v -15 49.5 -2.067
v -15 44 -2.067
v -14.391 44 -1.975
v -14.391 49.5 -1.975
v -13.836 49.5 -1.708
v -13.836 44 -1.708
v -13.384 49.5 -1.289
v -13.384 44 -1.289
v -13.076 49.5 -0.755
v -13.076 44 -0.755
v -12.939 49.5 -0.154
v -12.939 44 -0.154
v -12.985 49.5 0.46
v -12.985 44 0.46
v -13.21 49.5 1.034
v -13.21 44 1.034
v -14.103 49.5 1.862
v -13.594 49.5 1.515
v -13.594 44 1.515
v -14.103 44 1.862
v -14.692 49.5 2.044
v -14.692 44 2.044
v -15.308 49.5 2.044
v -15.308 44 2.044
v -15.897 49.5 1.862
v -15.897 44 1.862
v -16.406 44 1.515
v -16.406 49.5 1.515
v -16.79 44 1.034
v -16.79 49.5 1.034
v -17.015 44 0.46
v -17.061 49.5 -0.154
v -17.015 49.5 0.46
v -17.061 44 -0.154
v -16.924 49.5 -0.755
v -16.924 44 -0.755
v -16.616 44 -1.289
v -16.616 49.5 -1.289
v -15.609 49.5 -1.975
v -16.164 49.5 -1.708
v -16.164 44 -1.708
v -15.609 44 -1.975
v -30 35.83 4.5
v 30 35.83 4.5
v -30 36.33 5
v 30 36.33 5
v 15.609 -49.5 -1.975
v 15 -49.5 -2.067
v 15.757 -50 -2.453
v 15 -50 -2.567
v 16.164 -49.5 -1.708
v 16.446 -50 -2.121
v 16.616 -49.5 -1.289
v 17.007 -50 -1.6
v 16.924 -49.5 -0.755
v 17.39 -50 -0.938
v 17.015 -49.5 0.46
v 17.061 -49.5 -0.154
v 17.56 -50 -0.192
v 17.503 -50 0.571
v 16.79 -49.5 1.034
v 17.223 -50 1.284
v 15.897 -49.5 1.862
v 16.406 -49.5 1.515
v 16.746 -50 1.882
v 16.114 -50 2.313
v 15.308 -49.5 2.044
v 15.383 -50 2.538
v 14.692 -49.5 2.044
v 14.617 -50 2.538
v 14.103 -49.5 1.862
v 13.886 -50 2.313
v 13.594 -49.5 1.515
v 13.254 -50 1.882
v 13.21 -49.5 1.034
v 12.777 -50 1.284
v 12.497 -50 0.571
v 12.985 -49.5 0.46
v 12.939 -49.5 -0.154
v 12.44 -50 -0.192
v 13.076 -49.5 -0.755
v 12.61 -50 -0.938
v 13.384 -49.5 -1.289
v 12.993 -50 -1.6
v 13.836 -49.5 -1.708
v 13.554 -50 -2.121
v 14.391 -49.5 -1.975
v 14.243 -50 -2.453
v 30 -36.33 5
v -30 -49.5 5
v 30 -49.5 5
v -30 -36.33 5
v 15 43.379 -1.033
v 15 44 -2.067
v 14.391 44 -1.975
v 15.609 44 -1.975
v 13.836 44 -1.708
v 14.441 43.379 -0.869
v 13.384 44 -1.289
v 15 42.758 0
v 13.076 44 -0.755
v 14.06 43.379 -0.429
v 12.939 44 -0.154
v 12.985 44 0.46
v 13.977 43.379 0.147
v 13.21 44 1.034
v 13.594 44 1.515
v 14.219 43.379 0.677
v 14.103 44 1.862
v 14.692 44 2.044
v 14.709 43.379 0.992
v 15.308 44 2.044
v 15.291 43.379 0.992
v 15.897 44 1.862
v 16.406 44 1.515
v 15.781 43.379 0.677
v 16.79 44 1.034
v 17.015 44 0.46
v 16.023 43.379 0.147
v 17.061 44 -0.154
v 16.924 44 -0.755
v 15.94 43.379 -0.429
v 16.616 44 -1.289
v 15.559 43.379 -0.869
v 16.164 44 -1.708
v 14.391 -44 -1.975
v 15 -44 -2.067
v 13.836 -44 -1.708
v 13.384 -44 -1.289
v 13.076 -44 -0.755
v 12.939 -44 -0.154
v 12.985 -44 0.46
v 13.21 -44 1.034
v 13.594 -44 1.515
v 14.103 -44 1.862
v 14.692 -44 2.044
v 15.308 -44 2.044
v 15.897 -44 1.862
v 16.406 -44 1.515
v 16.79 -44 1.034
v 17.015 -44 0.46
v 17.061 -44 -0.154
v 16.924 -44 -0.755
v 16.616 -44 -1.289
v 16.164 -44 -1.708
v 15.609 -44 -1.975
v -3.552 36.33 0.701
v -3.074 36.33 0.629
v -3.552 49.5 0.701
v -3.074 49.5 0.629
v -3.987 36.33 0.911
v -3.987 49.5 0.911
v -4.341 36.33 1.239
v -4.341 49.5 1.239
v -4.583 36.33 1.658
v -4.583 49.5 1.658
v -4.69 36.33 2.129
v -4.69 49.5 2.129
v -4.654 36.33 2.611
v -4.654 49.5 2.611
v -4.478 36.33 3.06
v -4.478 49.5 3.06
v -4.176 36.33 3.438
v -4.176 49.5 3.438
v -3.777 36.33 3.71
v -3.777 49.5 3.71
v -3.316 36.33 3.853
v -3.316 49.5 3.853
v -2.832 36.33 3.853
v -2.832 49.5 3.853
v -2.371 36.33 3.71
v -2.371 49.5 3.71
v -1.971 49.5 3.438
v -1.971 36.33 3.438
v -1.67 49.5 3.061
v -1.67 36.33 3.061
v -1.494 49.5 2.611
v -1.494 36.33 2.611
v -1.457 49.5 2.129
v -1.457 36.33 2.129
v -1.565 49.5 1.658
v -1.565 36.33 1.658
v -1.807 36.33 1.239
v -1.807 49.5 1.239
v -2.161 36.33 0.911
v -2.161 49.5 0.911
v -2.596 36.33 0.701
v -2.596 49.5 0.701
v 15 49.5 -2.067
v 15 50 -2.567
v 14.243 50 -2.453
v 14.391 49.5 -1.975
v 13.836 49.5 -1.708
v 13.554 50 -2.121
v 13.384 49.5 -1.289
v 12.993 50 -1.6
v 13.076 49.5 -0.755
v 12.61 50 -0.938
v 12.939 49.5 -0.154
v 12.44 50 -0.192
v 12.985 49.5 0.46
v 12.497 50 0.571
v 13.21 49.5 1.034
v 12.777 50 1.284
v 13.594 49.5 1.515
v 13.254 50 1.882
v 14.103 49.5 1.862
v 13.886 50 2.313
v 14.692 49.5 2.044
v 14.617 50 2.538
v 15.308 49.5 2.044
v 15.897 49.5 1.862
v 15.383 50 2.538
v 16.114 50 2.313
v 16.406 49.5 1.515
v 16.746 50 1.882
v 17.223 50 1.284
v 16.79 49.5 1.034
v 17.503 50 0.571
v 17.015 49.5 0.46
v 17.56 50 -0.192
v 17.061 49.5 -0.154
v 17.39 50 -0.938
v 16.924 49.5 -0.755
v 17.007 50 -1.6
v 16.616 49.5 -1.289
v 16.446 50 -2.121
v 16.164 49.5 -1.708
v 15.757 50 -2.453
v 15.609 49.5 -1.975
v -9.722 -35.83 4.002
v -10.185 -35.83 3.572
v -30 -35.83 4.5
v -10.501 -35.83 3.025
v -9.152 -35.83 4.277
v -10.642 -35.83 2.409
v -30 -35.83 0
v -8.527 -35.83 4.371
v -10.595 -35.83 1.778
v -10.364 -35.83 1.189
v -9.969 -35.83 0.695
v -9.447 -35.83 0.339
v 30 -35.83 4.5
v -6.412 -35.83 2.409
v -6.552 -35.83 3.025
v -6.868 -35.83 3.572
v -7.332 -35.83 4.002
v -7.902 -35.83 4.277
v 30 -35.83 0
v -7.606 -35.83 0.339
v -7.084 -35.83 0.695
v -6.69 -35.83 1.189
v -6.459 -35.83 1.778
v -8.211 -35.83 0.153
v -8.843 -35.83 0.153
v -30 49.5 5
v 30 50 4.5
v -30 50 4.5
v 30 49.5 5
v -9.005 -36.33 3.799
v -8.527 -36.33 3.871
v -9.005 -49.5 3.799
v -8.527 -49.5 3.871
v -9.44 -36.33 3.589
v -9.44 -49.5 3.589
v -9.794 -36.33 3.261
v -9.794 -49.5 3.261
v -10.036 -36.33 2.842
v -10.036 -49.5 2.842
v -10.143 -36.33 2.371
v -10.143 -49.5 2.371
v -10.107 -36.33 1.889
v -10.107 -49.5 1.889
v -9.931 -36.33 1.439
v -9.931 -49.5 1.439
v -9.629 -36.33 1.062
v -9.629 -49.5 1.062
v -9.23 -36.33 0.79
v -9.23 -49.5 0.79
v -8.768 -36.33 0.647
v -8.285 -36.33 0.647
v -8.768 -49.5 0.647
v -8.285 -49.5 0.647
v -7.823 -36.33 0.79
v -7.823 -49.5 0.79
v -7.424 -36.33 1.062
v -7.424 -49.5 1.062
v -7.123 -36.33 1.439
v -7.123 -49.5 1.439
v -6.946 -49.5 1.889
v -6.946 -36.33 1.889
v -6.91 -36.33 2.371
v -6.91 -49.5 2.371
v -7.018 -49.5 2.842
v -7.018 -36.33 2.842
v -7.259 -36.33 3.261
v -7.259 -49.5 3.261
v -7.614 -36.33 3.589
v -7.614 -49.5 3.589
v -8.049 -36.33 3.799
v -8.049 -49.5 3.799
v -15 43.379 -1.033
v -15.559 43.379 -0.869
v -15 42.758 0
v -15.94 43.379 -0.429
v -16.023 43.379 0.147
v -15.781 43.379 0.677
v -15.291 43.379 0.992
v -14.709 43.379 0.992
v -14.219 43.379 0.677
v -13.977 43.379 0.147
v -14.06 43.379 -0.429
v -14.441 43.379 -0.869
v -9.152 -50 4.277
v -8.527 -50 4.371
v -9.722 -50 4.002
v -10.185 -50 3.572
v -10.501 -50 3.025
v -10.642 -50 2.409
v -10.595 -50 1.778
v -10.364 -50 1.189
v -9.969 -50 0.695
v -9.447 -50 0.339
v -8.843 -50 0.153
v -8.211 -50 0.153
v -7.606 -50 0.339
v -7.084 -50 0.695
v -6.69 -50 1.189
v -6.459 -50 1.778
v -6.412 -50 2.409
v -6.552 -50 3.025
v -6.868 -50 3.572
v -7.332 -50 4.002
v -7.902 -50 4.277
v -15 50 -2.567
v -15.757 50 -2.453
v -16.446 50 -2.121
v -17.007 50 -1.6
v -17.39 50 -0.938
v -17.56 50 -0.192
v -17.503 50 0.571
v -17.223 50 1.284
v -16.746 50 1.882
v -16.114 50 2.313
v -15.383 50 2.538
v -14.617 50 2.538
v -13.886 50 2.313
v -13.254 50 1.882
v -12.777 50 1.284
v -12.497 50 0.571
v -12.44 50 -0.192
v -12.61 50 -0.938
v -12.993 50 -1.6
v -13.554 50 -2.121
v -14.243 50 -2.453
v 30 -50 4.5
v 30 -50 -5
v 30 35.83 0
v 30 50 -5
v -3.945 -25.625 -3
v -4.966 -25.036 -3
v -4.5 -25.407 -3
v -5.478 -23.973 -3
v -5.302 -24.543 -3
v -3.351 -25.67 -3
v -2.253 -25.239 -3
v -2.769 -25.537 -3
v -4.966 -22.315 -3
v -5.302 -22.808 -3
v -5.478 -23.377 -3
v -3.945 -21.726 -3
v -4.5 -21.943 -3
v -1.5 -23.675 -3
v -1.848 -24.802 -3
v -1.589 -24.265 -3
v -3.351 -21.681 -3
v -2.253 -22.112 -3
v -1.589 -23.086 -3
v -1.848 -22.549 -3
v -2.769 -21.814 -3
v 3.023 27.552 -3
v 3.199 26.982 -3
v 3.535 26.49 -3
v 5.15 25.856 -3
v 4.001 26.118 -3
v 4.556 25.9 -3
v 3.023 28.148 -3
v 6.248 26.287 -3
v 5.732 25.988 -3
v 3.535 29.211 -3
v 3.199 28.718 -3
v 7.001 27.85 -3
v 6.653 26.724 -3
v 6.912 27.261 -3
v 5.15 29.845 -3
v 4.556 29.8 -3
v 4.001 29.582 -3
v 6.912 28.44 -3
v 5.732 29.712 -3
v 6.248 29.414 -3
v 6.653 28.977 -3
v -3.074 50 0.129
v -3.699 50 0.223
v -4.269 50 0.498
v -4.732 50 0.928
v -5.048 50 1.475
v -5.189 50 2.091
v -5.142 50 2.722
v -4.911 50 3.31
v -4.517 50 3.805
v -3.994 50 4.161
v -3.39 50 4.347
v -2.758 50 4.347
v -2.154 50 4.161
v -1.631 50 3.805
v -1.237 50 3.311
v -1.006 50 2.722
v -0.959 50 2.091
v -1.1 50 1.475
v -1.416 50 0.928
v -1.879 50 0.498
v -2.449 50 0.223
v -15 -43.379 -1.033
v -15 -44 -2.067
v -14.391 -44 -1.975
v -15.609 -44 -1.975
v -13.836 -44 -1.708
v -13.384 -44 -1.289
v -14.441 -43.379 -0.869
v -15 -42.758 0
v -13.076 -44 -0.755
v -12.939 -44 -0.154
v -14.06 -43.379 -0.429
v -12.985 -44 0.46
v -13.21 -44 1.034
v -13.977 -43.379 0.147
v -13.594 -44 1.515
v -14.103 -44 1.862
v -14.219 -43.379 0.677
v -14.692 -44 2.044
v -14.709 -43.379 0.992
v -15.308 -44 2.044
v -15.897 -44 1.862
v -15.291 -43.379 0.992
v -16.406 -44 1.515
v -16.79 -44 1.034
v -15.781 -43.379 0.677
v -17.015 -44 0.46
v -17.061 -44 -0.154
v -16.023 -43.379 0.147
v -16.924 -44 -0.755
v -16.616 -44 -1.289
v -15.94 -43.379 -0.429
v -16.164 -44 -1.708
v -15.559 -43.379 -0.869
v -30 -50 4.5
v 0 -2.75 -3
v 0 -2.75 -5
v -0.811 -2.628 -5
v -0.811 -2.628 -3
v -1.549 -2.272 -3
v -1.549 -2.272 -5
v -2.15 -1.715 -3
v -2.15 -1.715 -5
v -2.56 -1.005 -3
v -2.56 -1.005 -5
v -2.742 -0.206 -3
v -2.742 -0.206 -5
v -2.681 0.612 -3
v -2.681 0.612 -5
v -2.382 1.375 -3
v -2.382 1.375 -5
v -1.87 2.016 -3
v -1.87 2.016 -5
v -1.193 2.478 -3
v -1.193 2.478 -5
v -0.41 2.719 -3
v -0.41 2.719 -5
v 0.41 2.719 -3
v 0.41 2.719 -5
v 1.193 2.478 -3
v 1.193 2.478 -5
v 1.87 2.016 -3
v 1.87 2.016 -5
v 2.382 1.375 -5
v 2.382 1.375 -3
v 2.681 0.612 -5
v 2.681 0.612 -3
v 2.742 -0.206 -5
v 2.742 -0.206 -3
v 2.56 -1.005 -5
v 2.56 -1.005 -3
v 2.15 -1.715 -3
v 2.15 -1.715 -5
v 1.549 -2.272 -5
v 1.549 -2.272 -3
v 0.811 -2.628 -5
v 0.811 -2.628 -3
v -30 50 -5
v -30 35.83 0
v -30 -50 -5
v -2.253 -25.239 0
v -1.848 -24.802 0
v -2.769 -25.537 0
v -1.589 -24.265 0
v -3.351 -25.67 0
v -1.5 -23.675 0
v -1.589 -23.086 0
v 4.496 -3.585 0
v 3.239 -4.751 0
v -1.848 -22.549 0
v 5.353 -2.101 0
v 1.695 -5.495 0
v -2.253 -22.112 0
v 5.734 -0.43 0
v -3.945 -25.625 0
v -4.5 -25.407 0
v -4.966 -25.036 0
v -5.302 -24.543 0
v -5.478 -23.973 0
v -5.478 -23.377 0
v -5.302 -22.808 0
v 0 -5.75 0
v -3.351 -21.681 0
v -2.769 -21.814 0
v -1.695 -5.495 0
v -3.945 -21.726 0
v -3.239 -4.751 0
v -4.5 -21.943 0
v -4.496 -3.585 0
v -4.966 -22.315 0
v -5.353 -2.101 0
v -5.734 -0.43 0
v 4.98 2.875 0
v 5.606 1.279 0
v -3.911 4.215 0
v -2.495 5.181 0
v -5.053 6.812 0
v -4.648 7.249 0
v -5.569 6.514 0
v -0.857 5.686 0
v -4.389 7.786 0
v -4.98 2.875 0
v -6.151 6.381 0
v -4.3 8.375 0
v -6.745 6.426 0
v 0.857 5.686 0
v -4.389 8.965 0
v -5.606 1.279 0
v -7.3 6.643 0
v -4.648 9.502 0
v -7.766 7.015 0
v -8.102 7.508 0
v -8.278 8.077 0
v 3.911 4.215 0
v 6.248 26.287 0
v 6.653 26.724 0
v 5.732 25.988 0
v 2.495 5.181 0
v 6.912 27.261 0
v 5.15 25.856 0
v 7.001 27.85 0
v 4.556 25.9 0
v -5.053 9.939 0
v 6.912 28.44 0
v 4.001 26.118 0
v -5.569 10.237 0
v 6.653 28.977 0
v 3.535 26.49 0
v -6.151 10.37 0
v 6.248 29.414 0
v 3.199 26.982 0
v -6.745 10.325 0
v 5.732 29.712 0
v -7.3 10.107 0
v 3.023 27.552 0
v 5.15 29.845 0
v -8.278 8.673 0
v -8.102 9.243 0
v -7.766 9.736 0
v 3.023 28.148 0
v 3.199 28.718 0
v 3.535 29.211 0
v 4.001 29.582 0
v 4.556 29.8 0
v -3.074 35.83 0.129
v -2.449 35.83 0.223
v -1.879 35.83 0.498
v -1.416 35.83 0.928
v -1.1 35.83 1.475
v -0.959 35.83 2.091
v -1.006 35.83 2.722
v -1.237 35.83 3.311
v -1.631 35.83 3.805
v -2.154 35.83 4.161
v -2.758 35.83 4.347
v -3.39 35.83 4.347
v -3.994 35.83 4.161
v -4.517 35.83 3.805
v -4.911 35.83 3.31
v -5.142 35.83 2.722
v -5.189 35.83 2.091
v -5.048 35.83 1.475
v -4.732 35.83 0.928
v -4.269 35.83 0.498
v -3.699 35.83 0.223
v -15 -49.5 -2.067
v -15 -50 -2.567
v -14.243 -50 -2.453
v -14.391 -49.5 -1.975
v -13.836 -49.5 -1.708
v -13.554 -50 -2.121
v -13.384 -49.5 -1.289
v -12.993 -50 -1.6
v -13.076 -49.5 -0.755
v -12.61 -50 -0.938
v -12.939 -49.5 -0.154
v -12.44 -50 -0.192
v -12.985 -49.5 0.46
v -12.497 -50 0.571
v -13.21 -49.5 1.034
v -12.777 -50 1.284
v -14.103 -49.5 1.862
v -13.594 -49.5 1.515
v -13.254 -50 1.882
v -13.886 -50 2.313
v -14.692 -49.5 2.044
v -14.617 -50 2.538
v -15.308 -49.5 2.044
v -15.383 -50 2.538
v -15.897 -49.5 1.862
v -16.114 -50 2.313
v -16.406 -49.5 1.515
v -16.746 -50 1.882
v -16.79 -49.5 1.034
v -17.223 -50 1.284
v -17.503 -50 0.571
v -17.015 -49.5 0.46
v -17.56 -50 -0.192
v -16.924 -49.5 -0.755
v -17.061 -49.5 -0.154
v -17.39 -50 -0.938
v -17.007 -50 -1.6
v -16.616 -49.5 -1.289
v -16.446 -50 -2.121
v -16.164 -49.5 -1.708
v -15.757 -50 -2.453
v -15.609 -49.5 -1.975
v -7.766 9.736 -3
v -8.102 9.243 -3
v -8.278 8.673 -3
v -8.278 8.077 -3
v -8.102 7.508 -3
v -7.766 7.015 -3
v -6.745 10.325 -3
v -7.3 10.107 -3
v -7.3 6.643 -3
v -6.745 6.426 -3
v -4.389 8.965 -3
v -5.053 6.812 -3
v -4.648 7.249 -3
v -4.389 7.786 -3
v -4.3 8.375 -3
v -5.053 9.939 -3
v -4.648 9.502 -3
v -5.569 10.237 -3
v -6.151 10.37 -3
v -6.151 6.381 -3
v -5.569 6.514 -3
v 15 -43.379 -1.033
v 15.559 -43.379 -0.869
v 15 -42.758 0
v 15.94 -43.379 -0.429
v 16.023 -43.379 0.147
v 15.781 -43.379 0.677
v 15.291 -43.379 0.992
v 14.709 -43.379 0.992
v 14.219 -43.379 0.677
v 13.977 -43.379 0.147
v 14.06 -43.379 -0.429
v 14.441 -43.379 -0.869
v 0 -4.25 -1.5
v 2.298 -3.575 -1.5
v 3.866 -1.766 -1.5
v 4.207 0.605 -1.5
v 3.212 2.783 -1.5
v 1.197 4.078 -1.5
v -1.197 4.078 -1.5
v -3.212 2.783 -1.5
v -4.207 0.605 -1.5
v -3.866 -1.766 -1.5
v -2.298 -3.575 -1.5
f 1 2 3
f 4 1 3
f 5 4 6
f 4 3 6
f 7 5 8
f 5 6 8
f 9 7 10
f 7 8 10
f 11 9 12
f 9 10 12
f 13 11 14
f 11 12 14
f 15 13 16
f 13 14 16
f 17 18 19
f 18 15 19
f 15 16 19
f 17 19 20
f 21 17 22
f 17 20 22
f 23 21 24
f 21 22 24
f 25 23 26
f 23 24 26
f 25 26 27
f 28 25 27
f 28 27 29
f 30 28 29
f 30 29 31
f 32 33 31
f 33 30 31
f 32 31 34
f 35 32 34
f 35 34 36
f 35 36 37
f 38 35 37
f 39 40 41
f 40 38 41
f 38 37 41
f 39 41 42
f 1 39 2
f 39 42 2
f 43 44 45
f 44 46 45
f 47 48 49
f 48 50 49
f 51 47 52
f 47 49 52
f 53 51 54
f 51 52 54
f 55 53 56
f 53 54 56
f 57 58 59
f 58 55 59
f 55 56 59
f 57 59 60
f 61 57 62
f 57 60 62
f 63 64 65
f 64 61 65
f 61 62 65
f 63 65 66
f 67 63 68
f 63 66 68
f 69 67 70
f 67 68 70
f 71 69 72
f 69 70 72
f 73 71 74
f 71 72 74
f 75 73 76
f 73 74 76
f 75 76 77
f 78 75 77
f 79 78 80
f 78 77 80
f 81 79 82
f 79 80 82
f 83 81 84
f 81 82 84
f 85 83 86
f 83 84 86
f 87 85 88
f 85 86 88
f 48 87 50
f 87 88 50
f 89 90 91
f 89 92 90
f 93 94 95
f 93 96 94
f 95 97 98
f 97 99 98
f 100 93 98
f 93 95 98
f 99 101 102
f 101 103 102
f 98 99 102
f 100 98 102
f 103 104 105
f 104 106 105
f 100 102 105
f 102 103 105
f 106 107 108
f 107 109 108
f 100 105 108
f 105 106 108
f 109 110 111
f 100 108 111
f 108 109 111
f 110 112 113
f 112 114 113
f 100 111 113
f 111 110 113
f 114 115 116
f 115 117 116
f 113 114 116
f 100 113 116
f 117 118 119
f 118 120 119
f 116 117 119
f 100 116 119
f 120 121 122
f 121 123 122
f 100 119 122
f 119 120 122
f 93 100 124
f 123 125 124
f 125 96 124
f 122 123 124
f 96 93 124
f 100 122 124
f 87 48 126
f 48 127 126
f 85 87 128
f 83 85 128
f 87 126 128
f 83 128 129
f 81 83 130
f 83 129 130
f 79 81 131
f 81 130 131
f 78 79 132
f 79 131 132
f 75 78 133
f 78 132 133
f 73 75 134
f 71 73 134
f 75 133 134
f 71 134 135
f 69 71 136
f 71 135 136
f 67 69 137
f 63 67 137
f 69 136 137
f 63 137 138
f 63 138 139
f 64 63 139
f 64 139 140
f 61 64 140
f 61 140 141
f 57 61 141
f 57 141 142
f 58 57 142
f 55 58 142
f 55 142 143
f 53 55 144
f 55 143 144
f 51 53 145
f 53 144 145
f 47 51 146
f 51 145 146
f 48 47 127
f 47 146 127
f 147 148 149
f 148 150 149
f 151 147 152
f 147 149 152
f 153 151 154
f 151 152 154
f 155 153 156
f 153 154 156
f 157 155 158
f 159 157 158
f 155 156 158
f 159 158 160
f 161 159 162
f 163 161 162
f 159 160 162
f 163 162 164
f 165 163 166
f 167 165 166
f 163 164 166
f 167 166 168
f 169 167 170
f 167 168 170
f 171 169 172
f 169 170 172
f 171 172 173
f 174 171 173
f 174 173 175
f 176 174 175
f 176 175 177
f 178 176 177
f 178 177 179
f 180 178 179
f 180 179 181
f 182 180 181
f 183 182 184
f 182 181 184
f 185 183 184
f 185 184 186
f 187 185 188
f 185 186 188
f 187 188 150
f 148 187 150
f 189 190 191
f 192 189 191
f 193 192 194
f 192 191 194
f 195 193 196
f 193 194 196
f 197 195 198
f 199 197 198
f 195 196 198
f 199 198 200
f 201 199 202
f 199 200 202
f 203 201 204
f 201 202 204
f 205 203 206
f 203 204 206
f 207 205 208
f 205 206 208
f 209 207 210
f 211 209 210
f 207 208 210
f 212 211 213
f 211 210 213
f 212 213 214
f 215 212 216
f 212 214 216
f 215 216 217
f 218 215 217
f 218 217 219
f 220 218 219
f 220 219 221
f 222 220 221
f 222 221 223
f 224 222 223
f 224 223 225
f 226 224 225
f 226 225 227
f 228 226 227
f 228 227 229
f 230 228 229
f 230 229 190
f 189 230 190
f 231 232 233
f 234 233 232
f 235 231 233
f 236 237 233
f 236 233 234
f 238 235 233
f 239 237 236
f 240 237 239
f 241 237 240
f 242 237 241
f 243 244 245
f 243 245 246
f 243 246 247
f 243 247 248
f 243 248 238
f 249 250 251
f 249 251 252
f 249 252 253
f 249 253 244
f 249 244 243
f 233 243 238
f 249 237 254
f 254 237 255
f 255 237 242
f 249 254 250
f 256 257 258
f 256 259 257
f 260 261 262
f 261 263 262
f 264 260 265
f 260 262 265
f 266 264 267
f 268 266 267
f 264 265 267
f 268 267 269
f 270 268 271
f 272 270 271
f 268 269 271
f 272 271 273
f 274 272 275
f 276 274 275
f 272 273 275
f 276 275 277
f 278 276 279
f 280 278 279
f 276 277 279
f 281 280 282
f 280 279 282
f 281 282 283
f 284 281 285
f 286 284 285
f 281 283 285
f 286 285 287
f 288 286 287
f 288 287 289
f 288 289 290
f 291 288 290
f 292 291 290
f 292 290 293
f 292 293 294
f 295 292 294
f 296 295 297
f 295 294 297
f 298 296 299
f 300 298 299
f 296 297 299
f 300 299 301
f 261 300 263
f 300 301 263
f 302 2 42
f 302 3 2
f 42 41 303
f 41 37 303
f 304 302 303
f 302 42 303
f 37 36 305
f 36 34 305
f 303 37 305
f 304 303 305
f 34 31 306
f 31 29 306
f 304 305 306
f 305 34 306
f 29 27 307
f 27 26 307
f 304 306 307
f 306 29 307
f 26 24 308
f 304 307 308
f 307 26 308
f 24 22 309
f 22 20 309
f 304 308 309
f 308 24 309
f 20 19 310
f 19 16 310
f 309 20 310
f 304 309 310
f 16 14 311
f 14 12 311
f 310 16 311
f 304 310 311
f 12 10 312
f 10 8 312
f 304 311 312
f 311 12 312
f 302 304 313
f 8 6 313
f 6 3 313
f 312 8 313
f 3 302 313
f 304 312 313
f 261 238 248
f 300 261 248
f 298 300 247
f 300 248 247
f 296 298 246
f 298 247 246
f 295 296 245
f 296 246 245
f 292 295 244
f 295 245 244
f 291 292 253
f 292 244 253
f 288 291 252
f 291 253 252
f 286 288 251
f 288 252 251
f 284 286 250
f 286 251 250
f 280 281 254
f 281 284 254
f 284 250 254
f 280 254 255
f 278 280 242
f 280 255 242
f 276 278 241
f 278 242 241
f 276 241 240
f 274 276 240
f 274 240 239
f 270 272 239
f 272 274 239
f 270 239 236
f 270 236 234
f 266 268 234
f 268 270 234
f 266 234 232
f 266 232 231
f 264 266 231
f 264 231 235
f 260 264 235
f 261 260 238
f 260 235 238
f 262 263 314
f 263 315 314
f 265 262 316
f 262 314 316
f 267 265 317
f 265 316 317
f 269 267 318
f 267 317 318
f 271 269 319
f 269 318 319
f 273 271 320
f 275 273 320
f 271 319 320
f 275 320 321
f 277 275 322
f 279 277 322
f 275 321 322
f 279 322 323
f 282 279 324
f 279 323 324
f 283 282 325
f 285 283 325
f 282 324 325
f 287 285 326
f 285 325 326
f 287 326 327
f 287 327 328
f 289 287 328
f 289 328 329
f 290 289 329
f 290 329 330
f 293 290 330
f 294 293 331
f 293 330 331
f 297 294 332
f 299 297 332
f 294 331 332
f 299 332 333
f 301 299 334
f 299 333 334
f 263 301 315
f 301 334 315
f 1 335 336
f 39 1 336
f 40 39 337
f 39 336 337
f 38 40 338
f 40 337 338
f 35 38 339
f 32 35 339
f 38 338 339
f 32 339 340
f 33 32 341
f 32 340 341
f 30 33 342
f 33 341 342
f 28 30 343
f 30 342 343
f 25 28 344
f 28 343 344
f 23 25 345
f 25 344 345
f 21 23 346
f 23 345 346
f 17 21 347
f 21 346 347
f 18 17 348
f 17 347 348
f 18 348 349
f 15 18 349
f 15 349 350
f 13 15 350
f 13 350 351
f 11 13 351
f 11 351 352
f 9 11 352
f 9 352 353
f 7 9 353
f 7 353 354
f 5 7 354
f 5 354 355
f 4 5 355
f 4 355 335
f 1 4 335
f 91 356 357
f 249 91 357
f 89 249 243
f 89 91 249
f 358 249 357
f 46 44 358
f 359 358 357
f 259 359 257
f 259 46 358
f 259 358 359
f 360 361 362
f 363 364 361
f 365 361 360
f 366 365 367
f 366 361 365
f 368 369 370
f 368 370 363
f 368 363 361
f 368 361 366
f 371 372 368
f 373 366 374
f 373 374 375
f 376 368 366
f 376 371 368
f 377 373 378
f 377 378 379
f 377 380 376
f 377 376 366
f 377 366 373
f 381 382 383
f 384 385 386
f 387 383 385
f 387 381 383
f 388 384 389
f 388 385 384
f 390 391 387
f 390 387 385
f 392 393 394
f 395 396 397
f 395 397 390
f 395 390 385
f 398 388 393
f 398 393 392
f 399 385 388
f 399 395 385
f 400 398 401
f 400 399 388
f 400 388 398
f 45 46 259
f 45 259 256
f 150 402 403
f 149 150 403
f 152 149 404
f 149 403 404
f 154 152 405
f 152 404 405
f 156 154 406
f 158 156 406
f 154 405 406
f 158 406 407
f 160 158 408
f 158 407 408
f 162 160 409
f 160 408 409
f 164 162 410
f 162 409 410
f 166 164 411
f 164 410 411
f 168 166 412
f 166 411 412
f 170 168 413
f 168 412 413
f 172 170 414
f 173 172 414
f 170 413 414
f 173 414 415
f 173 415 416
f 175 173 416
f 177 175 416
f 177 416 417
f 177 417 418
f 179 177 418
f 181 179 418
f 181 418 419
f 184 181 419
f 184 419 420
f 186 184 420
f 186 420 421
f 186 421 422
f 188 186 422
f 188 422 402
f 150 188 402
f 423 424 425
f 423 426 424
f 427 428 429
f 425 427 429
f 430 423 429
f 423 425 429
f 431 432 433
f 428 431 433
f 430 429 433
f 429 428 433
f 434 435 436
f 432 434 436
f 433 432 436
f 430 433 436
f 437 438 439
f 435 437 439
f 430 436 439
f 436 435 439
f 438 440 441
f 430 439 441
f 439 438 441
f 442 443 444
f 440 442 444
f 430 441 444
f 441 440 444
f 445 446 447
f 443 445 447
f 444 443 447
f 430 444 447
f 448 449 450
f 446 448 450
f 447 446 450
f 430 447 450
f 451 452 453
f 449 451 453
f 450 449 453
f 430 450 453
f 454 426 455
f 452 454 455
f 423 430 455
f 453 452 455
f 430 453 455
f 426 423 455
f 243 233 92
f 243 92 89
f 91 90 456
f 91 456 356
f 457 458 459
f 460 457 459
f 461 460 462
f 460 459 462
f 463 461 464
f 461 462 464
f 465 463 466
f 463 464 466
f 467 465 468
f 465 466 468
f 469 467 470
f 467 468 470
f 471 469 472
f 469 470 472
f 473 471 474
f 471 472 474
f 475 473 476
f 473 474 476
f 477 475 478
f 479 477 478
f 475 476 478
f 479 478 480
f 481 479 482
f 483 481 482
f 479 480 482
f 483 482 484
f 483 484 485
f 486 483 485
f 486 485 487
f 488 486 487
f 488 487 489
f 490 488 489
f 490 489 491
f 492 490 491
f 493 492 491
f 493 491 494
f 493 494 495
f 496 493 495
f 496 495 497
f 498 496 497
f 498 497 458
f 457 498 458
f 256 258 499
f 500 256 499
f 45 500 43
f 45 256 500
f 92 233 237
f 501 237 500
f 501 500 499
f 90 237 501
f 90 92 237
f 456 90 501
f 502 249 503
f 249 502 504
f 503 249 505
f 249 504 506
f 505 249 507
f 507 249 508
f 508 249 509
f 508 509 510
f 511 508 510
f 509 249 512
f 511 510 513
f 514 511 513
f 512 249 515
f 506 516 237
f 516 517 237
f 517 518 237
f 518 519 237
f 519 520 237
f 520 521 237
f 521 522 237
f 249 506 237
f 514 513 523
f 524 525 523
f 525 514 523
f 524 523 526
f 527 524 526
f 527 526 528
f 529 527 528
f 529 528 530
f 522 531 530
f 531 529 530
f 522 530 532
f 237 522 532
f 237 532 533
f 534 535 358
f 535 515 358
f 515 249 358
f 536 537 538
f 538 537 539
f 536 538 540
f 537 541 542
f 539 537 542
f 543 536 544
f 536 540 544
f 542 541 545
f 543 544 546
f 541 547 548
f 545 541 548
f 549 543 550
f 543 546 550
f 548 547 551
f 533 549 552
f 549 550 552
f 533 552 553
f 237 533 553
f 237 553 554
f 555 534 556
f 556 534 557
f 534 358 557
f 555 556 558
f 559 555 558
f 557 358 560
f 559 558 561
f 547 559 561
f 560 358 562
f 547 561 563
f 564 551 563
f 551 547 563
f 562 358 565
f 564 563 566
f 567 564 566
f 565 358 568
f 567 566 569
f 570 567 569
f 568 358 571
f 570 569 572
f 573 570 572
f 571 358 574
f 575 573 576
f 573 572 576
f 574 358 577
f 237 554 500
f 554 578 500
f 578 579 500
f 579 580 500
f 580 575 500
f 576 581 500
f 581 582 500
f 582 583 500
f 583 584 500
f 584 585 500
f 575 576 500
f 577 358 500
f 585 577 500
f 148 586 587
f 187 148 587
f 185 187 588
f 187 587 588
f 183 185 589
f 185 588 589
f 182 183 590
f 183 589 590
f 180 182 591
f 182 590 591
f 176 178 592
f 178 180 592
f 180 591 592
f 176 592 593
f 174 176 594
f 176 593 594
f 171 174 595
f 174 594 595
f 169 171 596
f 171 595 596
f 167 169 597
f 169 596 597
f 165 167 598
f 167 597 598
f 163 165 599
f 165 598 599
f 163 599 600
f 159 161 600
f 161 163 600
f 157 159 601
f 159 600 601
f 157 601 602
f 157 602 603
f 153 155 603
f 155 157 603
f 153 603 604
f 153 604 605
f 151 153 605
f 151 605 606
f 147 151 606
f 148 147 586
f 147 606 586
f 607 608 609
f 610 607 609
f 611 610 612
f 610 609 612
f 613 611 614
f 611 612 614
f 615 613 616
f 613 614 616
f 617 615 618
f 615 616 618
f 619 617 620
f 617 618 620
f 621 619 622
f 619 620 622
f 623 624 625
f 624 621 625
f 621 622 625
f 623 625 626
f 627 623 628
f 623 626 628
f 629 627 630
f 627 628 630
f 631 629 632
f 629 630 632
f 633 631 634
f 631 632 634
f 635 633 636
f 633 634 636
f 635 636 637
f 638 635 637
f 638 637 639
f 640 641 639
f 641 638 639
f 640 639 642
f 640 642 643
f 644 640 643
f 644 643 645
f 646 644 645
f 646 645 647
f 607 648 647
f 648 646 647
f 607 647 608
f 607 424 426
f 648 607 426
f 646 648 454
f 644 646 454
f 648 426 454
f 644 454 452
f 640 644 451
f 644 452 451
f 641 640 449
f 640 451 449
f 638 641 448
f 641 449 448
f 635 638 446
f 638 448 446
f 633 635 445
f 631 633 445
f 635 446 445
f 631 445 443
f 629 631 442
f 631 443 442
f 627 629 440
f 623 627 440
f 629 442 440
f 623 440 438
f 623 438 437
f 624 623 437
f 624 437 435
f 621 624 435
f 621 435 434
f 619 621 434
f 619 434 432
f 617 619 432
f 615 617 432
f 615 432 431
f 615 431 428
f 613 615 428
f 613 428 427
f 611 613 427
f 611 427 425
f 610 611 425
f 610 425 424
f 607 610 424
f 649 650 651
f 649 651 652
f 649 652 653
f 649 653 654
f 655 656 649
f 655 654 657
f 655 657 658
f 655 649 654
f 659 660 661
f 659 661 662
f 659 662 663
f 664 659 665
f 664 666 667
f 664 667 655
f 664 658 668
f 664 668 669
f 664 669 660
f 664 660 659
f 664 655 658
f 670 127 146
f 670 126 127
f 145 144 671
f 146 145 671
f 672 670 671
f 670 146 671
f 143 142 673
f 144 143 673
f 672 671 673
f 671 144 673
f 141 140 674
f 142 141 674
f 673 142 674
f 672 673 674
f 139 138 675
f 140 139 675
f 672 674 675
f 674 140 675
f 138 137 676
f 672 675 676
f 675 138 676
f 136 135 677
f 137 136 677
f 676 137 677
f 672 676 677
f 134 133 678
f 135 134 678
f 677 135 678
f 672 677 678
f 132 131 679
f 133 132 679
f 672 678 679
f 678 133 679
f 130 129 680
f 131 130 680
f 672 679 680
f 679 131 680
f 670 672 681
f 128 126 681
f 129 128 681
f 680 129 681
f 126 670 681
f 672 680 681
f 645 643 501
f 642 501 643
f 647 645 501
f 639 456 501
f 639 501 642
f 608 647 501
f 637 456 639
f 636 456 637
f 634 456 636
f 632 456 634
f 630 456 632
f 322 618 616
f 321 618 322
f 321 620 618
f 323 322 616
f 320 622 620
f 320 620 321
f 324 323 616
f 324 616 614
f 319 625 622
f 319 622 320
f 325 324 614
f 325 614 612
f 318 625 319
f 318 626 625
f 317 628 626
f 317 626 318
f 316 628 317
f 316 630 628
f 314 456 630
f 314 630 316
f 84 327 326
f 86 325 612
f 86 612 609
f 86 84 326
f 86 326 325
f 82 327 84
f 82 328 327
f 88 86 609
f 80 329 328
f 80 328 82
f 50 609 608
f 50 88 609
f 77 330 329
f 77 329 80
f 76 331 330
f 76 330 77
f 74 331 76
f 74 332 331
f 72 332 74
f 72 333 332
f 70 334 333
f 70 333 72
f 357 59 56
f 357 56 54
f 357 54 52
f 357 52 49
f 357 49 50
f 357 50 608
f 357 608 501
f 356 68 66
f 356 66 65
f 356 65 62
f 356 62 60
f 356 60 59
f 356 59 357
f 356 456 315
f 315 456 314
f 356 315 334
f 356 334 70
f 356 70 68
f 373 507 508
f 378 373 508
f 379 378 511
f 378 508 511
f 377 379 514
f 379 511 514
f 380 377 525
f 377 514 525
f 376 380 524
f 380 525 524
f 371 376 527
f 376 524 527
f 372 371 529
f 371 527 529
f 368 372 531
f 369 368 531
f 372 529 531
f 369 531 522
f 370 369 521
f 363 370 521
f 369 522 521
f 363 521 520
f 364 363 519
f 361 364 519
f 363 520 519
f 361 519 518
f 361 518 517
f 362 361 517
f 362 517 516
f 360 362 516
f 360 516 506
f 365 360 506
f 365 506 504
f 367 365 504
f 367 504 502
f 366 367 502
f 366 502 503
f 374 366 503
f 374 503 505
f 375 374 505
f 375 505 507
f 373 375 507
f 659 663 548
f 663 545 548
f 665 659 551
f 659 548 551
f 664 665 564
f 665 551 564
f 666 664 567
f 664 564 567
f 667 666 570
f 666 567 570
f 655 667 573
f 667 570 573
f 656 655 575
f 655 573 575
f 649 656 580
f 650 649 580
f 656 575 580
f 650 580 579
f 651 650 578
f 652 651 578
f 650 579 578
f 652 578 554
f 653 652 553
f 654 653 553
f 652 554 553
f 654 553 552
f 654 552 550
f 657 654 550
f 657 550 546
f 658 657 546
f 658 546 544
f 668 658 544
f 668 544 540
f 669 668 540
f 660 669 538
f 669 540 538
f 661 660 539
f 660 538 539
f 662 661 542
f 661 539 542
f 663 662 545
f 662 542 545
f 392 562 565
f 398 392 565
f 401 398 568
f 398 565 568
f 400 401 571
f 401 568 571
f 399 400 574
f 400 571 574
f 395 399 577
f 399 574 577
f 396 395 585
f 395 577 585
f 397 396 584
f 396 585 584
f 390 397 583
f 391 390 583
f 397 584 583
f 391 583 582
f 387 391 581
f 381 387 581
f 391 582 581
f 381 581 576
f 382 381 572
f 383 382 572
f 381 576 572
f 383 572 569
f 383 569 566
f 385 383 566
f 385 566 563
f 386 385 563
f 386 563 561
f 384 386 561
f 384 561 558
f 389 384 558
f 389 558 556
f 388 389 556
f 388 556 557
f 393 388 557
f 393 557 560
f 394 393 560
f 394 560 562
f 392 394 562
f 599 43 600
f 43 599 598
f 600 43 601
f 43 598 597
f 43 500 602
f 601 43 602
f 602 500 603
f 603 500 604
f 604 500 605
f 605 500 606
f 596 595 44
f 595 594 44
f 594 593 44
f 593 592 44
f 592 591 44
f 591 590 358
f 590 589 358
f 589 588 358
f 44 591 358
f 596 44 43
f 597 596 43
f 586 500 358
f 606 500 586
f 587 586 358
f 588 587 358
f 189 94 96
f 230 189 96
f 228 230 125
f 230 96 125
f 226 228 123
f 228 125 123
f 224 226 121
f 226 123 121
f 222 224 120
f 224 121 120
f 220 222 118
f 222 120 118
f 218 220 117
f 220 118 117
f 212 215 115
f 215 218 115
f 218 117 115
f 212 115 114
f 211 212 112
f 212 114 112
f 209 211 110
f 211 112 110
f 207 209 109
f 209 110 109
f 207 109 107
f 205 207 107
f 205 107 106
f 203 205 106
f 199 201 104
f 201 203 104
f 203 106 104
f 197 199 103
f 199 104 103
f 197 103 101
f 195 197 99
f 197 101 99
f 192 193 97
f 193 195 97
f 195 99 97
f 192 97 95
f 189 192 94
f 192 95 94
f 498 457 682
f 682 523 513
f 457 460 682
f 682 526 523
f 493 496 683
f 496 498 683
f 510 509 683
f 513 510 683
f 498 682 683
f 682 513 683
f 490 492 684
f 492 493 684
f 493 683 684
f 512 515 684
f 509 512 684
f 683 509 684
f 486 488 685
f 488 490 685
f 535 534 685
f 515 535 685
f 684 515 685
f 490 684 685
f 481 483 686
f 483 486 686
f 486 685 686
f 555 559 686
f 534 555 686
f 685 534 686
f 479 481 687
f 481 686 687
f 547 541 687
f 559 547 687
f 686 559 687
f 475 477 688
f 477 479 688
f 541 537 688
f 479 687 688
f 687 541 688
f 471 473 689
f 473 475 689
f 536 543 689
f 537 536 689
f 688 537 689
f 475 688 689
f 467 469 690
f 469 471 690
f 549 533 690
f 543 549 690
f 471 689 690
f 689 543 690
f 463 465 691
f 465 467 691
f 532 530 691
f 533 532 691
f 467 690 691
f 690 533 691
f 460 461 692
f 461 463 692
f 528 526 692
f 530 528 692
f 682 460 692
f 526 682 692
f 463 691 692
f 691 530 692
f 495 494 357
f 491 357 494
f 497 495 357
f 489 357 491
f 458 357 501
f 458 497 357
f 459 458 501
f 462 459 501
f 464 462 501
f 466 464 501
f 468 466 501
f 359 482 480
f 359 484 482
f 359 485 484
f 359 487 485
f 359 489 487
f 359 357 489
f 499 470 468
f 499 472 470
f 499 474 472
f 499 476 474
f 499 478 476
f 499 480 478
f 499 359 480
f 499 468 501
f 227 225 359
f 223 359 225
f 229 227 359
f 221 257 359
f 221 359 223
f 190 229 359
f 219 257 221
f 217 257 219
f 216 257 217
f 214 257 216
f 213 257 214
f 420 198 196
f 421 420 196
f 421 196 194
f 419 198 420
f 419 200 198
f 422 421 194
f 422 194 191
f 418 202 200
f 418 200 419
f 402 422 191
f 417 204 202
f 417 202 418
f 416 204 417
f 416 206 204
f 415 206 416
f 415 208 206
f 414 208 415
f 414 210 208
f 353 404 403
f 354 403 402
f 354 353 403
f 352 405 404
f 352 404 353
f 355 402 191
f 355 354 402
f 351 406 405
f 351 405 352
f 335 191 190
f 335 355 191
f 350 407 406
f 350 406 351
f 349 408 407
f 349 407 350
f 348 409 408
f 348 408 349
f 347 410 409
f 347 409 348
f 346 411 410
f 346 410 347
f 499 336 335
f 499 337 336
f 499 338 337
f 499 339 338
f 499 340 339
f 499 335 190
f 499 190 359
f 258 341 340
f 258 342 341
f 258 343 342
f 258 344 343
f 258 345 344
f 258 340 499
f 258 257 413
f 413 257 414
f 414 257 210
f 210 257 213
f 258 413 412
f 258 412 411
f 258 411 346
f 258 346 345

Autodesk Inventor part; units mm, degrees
ref_plane "YZ Plane" through (0, 0, 0) normal (1, 0, 0) x (0, 1, 0)
ref_plane "XZ Plane" through (0, 0, 0) normal (0, 1, 0) x (-1, 0, 0)
ref_plane "XY Plane" through (0, 0, 0) normal (0, 0, 1) x (1, 0, 0)
sketch "Skizze1" plane through (0, 0, 0) normal (0, 0, 1) x (1, 0, 0)
  arc A0 (-7.910725, 24.207043) -> (-7.910891, 20.407043) centre (-6.063513, 22.306962) ccw
  line L0 (-7.910725, 24.207043) -> (-4.216135, 24.206882)
  arc A1 (-4.216301, 20.406882) -> (-4.216135, 24.206882) centre (-6.063513, 22.306962) ccw
  line L1 (-4.216301, 20.406882) -> (-7.910891, 20.407043)
  spline S0 degree 3 poles (4.168227, 35.189684) (1.190462, 36.459804) (-2.249662, 35.164227) (-6.254955, 34.158153) (-11.73606, 32.147863) (-17.267484, 27.437) (-17.397864, 22.280527) (-19.179409, 11.837341) (-24.204265, -4.219772) (-21.912215, -21.361857) (-15.72629, -32.136108) (-8.960071, -34.873142) (-7.734356, -35.206805) knots 0 0 0 0 0.05534958 0.07652777 0.21178189 0.29554676 0.38296386 0.43292215 0.75488434 0.81234043 0.96723776 1 1 1 1
  spline S1 degree 3 poles (-7.734356, -35.206805) (-2.439109, -36.648242) (4.93418, -35.14496) (14.388893, -31.364077) (20.220621, -28.276552) (23.084745, -23.179223) (23.280953, -18.995872) (17.306215, -16.499664) (13.73981, -19.293705) (6.907357, -22.933236) (-1.198572, -27.162074) (-10.305482, -22.9326) (-14.035245, -10.40017) (-9.459871, -0.926027) (-6.833349, 0.315314) (-5.918232, 2.05884) (-5.936684, 4.17913) (-8.288714, 5.230646) (-8.364147, 10.437319) (-1.010592, 14.125066) (4.082108, 20.05073) (3.063503, 26.302613) (2.949283, 28.613576) (3.78883, 29.833993) (5.577793, 31.092404) (6.613193, 32.774527) (5.245759, 34.708646) (4.265654, 35.148112) (4.168227, 35.189684) knots 0 0 0 0 0.1415298 0.17035016 0.24598676 0.2589199 0.29022703 0.32626485 0.37223258 0.38897966 0.48209608 0.50825566 0.62441589 0.64741797 0.71527435 0.72606992 0.74689162 0.80172241 0.81188461 0.84851364 0.9163561 0.94337427 0.94821885 0.96295932 0.96650966 0.98187972 0.99818797 1 1 1 1
  line L2 (-4.216301, 20.406882) -> (-7.910891, 20.407043)
  arc A2 (-4.216301, 20.406882) -> (-4.216135, 24.206882) centre (-6.063513, 22.306962) ccw
  line L3 (-7.910725, 24.207043) -> (-4.216135, 24.206882)
  arc A3 (-7.910725, 24.207043) -> (-7.910891, 20.407043) centre (-6.063513, 22.306962) ccw
  line L4 (-22.994876, 35.829551) -> (22.994876, 35.829551) construction
  line L5 (22.994876, 35.829551) -> (22.994876, -35.829551) construction
  line L6 (22.994876, -35.829551) -> (-22.994876, -35.829551) construction
  line L7 (-22.994876, -35.829551) -> (-22.994876, 35.829551) construction
  line L8 (-22.994876, 35.829551) -> (22.994876, -35.829551) construction
  line L9 (-22.994876, -35.829551) -> (22.994876, 35.829551) construction
  circle A4 centre (3.874552, -36.279551) radius 1.25 construction
  line L10 (1.214575, -35.829551) -> (11.587679, -35.829551) construction
  line L11 (3.874552, -36.279551) -> (3.874552, -35.029551) construction
  circle A5 centre (4.795469, 36.279551) radius 1.25 construction
  line L12 (4.795469, 36.279551) -> (4.795469, 35.029551) construction
  line L13 (3.124047, 35.829551) -> (12.547009, 35.829551) construction
  point P0 (0, 0)
  point P1 (0, 0)
  point P2 (0, 0)
  dimension "d88" = 2.5
  dimension "d91" = 2.5
  dimension "d89" = 0.8
  dimension "d92" = 0.8
sketch "Skizze9" plane through (0, 0, 0) normal (0, 0, 1) x (1, 0, 0)
  line L0 (-30, 46) -> (30, 46)
  line L1 (30, 46) -> (30, -46)
  line L2 (30, -46) -> (-30, -46)
  line L3 (-30, 46) -> (30, -46) construction
  line L4 (30, 46) -> (-30, -46) construction
  spline S0 degree 3 poles (4.168227, 35.189684) (1.190462, 36.459804) (-2.249662, 35.164227) (-6.254955, 34.158153) (-11.73606, 32.147863) (-17.267484, 27.437) (-17.397864, 22.280527) (-19.179409, 11.837341) (-24.204265, -4.219772) (-21.912215, -21.361857) (-15.72629, -32.136108) (-8.960071, -34.873142) (-7.734356, -35.206805) knots 0 0 0 0 0.05534958 0.07652777 0.21178189 0.29554676 0.38296386 0.43292215 0.75488434 0.81234043 0.96723776 1 1 1 1
  spline S1 degree 3 poles (-7.734356, -35.206805) (-2.439109, -36.648242) (4.93418, -35.14496) (14.388893, -31.364077) (20.220621, -28.276552) (23.084745, -23.179223) (23.280953, -18.995872) (17.306215, -16.499664) (13.73981, -19.293705) (6.907357, -22.933236) (-1.198572, -27.162074) (-10.305482, -22.9326) (-14.035245, -10.40017) (-9.459871, -0.926027) (-6.833349, 0.315314) (-5.918232, 2.05884) (-5.936684, 4.17913) (-8.288714, 5.230646) (-8.364147, 10.437319) (-1.010592, 14.125066) (4.082108, 20.05073) (3.063503, 26.302613) (2.949283, 28.613576) (3.78883, 29.833993) (5.577793, 31.092404) (6.613193, 32.774527) (5.245759, 34.708646) (4.265654, 35.148112) (4.168227, 35.189684) knots 0 0 0 0 0.1415298 0.17035016 0.24598676 0.2589199 0.29022703 0.32626485 0.37223258 0.38897966 0.48209608 0.50825566 0.62441589 0.64741797 0.71527435 0.72606992 0.74689162 0.80172241 0.81188461 0.84851364 0.9163561 0.94337427 0.94821885 0.96295932 0.96650966 0.98187972 0.99818797 1 1 1 1
  circle A0 centre (-3.5, -23.6754) radius 2
  circle A1 centre (5.000912, 27.85018) radius 2
  circle A2 centre (-6.3, 8.375362) radius 2
  line L5 (-30, -35.829553) -> (30, -35.829553)
  line L6 (-30, -46) -> (-30, 46)
  line L7 (-30, 35.829552) -> (30, 35.829552)
  point P0 (0, 0)
  point P1 (-2.781906, -35.829553)
  point P2 (1.073951, 35.829552)
  dimension "Laenge_aussen" = 105
  dimension "d68" = 60
  dimension "d69" = 92
  dimension "d180" = 4
  dimension "d182" = 4
  dimension "d183" = 4
  dimension "d184" = 33.5
  dimension "d186" = 24.99909
  dimension "d221" = 36.3
extrude "Extrusion3" add sketch "Skizze9" along normal blind 5 contours L0 L1 L7 L6 | L5 L1 L2 L6
sketch "Skizze11" plane through (0, 0, 0) normal (0, 0, -1) x (-1, 0, 0)
  line L0 (30, -46) -> (-30, -46) projected
  line L1 (30, 46) -> (30, -46) projected
  line L2 (-30, -46) -> (30, -46)
  line L3 (30, -46) -> (30, 46)
  line L4 (30, 46) -> (-30, 46)
  line L5 (-30, 46) -> (-30, -46)
  point P0 (0, 0)
extrude "Extrusion4" add sketch "Skizze11" along normal blind 1.5
chamfer "Fasen2" distance 0.5 angle 45 2 edges at (0, -35.8296, 5) (0, 35.8296, 5)
sketch "Skizze15" plane through (-30, 46, 5) normal (0, 1, 0) x (1, 0, 0)
  line L0 (60, 0) -> (0, 0) projected
  line L1 (0, 6.5) -> (60, 6.5) projected
  line L2 (60, 0) -> (0, 0)
  line L3 (0, 0) -> (0, 6.5)
  line L4 (0, 6.5) -> (60, 6.5)
  line L5 (60, 6.5) -> (60, 0)
  point P0 (30, 5)
extrude "Extrusion6" add sketch "Skizze15" along normal blind 4
sketch "Skizze16" plane through (-30, -46, 5) normal (0, -1, 0) x (1, 0, 0)
  line L0 (0, -6.5) -> (0, 0) projected
  line L1 (60, -6.5) -> (0, -6.5) projected
  line L2 (0, 0) -> (60, 0)
  line L3 (60, 0) -> (60, -6.5)
  line L4 (60, -6.5) -> (0, -6.5)
  line L5 (0, -6.5) -> (0, 0)
  point P0 (30, -5)
extrude "Extrusion7" add sketch "Skizze16" along normal blind 4
sketch "Skizze17" plane through (0, 0, -1.5) normal (0, 0, -1) x (-1, 0, 0)
  line L0 (30, 50) -> (30, -50) projected
  line L1 (-30, 50) -> (30, 50) projected
  line L2 (-30, -50) -> (-30, 50) projected
  line L3 (30, -50) -> (-30, -50) projected
  point P0 (0, 0)
extrude "Extrusion8" add sketch "Skizze17" along normal blind 3.5
chamfer "Fasen4" distance 0.5 angle 45 2 edges at (0, 50, 5) (0, -50, 5)
sketch "Skizze20" plane through (0, 0, 0) normal (0, 0, 1) x (1, 0, 0)
  line L0 (-30, -50) -> (30, -50)
  line L1 (30, 35.829552) -> (30, -35.829553)
  point P0 (0, 0)
  point P1 (-30, -46.5)
  point P2 (0, 0)
hole "Bohrung10" at (0, 0, 0) direction (0, 0, -1) diameter 5.5 end through all countersink diameter 11.5 countersink angle 90
sketch "Skizze21" plane through (-30, -50, 5) normal (0, -1, 0) x (1, 0, 0)
  line L0 (60, -10) -> (0, -10) projected
  line L1 (60, 0) -> (0, 0) projected
  line L2 (60, -0.5) -> (60, -10) projected
  line L3 (0, -0.5) -> (0, -10) projected
  point P0 (30, -5)
  point P1 (15, -5)
  point P2 (45, -5)
  point P3 (60, -5.25)
  dimension "d161" = 10
  dimension "d163" = 60
  dimension "d164" = 15
  dimension "d165" = 15
  dimension "d179" = 5
hole "Bohrung11" at (15, -50, 0) at (-15, -50, 0) direction (0, 1, 0) diameter 4.134 depth 6 tip angle 118 thread size "M5x0.8" class "6H" standard "ISO Metric profile"
chamfer "Fasen5" distance 0.5 angle 45 2 edges at (-15, -50, 2.067) (15, -50, 2.067)
mirror "Spiegeln4" about plane through (0, 0, 0) normal (0, 1, 0) of "Bohrung11"
chamfer "Fasen6" distance 0.5 angle 45 2 edges at (15, 50, 2.067) (-15, 50, 2.067)
sketch "Skizze22" plane through (0, 0, 0) normal (0, 0, 1) x (1, 0, 0)
  circle A0 centre (-8.52675, -36.279553) radius 1.25 construction
  line L0 (30, -35.829553) -> (-30, -35.829553) construction
  line L1 (-19.029206, -35.029553) -> (-13.234121, -35.029553) construction
  spline S0 degree 3 poles (4.168227, 35.189684) (1.190462, 36.459804) (-2.249662, 35.164227) (-6.254955, 34.158153) (-11.73606, 32.147863) (-17.267484, 27.437) (-17.397864, 22.280527) (-19.179409, 11.837341) (-24.204265, -4.219772) (-21.912215, -21.361857) (-15.72629, -32.136108) (-8.960071, -34.873142) (-7.734356, -35.206805) knots 0 0 0 0 0.05534958 0.07652777 0.21178189 0.29554676 0.38296386 0.43292215 0.75488434 0.81234043 0.96723776 1 1 1 1 construction
  circle A1 centre (-3.073907, 36.279552) radius 1.25 construction
  line L2 (-18.70543, 35.029552) -> (-14.396256, 35.029552) construction
  line L3 (-30, 35.829552) -> (30, 35.829552) construction
  point P0 (0, 0)
  dimension "d188" = 2.5
  dimension "d189" = 0.8
  dimension "d190" = 2.5
  dimension "d191" = 0.8
sketch "Skizze23" plane through (-30, -35.829553, 0) normal (0, 1, 0) x (1, 0, 0)
  line L0 (20.22325, 0) -> (22.72325, 0) construction
  line L1 (0, -5) -> (60, -5)
  line L2 (60, -4.5) -> (0, -4.5)
  line L3 (60, 0) -> (0, 0)
  point P0 (30, 0)
  point P1 (21.47325, -2.25)
  point P2 (21.47325, 0)
  dimension "d218" = 4.5
  dimension "d219" = 2.25
hole "Bohrung12" at (-8.52675, -35.829553, 2.25) direction (0, -1, 0) diameter 3.242 end through all thread size "M4x0.7" class "6H" standard "ISO Metric profile"
chamfer "Fasen7" distance 0.5 angle 45 2 edges at (-8.5267, -35.8296, 0.629) (-8.5267, -50, 0.629)
sketch "Skizze24" plane through (-30, 35.829552, 0) normal (0, -1, 0) x (1, 0, 0)
  line L0 (28.176093, 0) -> (25.676093, 0) construction
  line L1 (60, 5) -> (0, 5)
  line L2 (0, 0) -> (60, 0)
  line L3 (0, 4.5) -> (60, 4.5)
  point P0 (30, 0)
  point P1 (26.926093, 2.25)
  point P2 (26.926093, 0)
  dimension "d205" = 2.25
  dimension "d220" = 4.5
hole "Bohrung13" at (-3.073907, 35.829552, 2.25) direction (0, 1, 0) diameter 3.242 end through all thread size "M4x0.7" class "6H" standard "ISO Metric profile"
chamfer "Fasen8" distance 0.5 angle 45 2 edges at (-3.0739, 35.8296, 3.871) (-3.0739, 50, 3.871)
extrude "Extrusion10" cut sketch "Skizze9" against normal blind 3 contours A0 | A2 | A1
equation "\"d91\" = Kugeldurchmesser"
equation "\"d89\" = Kugelhoehe"
equation "\"d92\" = Kugelhoehe"
equation "\"Laenge_aussen\" = Laenge_innen + 2 * Wanddicke"
equation "\"d68\" = Breite_innen"
equation "\"d191\" = d189"
equation "\"Breite_innen\" = 60"
equation "\"Laenge_innen\" = 85"
equation "\"Absatz\" = 2"
equation "\"Kugeldurchmesser\" = 2.5"
equation "\"Kugelhoehe\" = 0.8"
equation "\"Anbindung_Kolben\" = 15"
equation "\"Wanddicke\" = 10"
properties part number "TS_V1_Fallmagazin_Wandung_int"
